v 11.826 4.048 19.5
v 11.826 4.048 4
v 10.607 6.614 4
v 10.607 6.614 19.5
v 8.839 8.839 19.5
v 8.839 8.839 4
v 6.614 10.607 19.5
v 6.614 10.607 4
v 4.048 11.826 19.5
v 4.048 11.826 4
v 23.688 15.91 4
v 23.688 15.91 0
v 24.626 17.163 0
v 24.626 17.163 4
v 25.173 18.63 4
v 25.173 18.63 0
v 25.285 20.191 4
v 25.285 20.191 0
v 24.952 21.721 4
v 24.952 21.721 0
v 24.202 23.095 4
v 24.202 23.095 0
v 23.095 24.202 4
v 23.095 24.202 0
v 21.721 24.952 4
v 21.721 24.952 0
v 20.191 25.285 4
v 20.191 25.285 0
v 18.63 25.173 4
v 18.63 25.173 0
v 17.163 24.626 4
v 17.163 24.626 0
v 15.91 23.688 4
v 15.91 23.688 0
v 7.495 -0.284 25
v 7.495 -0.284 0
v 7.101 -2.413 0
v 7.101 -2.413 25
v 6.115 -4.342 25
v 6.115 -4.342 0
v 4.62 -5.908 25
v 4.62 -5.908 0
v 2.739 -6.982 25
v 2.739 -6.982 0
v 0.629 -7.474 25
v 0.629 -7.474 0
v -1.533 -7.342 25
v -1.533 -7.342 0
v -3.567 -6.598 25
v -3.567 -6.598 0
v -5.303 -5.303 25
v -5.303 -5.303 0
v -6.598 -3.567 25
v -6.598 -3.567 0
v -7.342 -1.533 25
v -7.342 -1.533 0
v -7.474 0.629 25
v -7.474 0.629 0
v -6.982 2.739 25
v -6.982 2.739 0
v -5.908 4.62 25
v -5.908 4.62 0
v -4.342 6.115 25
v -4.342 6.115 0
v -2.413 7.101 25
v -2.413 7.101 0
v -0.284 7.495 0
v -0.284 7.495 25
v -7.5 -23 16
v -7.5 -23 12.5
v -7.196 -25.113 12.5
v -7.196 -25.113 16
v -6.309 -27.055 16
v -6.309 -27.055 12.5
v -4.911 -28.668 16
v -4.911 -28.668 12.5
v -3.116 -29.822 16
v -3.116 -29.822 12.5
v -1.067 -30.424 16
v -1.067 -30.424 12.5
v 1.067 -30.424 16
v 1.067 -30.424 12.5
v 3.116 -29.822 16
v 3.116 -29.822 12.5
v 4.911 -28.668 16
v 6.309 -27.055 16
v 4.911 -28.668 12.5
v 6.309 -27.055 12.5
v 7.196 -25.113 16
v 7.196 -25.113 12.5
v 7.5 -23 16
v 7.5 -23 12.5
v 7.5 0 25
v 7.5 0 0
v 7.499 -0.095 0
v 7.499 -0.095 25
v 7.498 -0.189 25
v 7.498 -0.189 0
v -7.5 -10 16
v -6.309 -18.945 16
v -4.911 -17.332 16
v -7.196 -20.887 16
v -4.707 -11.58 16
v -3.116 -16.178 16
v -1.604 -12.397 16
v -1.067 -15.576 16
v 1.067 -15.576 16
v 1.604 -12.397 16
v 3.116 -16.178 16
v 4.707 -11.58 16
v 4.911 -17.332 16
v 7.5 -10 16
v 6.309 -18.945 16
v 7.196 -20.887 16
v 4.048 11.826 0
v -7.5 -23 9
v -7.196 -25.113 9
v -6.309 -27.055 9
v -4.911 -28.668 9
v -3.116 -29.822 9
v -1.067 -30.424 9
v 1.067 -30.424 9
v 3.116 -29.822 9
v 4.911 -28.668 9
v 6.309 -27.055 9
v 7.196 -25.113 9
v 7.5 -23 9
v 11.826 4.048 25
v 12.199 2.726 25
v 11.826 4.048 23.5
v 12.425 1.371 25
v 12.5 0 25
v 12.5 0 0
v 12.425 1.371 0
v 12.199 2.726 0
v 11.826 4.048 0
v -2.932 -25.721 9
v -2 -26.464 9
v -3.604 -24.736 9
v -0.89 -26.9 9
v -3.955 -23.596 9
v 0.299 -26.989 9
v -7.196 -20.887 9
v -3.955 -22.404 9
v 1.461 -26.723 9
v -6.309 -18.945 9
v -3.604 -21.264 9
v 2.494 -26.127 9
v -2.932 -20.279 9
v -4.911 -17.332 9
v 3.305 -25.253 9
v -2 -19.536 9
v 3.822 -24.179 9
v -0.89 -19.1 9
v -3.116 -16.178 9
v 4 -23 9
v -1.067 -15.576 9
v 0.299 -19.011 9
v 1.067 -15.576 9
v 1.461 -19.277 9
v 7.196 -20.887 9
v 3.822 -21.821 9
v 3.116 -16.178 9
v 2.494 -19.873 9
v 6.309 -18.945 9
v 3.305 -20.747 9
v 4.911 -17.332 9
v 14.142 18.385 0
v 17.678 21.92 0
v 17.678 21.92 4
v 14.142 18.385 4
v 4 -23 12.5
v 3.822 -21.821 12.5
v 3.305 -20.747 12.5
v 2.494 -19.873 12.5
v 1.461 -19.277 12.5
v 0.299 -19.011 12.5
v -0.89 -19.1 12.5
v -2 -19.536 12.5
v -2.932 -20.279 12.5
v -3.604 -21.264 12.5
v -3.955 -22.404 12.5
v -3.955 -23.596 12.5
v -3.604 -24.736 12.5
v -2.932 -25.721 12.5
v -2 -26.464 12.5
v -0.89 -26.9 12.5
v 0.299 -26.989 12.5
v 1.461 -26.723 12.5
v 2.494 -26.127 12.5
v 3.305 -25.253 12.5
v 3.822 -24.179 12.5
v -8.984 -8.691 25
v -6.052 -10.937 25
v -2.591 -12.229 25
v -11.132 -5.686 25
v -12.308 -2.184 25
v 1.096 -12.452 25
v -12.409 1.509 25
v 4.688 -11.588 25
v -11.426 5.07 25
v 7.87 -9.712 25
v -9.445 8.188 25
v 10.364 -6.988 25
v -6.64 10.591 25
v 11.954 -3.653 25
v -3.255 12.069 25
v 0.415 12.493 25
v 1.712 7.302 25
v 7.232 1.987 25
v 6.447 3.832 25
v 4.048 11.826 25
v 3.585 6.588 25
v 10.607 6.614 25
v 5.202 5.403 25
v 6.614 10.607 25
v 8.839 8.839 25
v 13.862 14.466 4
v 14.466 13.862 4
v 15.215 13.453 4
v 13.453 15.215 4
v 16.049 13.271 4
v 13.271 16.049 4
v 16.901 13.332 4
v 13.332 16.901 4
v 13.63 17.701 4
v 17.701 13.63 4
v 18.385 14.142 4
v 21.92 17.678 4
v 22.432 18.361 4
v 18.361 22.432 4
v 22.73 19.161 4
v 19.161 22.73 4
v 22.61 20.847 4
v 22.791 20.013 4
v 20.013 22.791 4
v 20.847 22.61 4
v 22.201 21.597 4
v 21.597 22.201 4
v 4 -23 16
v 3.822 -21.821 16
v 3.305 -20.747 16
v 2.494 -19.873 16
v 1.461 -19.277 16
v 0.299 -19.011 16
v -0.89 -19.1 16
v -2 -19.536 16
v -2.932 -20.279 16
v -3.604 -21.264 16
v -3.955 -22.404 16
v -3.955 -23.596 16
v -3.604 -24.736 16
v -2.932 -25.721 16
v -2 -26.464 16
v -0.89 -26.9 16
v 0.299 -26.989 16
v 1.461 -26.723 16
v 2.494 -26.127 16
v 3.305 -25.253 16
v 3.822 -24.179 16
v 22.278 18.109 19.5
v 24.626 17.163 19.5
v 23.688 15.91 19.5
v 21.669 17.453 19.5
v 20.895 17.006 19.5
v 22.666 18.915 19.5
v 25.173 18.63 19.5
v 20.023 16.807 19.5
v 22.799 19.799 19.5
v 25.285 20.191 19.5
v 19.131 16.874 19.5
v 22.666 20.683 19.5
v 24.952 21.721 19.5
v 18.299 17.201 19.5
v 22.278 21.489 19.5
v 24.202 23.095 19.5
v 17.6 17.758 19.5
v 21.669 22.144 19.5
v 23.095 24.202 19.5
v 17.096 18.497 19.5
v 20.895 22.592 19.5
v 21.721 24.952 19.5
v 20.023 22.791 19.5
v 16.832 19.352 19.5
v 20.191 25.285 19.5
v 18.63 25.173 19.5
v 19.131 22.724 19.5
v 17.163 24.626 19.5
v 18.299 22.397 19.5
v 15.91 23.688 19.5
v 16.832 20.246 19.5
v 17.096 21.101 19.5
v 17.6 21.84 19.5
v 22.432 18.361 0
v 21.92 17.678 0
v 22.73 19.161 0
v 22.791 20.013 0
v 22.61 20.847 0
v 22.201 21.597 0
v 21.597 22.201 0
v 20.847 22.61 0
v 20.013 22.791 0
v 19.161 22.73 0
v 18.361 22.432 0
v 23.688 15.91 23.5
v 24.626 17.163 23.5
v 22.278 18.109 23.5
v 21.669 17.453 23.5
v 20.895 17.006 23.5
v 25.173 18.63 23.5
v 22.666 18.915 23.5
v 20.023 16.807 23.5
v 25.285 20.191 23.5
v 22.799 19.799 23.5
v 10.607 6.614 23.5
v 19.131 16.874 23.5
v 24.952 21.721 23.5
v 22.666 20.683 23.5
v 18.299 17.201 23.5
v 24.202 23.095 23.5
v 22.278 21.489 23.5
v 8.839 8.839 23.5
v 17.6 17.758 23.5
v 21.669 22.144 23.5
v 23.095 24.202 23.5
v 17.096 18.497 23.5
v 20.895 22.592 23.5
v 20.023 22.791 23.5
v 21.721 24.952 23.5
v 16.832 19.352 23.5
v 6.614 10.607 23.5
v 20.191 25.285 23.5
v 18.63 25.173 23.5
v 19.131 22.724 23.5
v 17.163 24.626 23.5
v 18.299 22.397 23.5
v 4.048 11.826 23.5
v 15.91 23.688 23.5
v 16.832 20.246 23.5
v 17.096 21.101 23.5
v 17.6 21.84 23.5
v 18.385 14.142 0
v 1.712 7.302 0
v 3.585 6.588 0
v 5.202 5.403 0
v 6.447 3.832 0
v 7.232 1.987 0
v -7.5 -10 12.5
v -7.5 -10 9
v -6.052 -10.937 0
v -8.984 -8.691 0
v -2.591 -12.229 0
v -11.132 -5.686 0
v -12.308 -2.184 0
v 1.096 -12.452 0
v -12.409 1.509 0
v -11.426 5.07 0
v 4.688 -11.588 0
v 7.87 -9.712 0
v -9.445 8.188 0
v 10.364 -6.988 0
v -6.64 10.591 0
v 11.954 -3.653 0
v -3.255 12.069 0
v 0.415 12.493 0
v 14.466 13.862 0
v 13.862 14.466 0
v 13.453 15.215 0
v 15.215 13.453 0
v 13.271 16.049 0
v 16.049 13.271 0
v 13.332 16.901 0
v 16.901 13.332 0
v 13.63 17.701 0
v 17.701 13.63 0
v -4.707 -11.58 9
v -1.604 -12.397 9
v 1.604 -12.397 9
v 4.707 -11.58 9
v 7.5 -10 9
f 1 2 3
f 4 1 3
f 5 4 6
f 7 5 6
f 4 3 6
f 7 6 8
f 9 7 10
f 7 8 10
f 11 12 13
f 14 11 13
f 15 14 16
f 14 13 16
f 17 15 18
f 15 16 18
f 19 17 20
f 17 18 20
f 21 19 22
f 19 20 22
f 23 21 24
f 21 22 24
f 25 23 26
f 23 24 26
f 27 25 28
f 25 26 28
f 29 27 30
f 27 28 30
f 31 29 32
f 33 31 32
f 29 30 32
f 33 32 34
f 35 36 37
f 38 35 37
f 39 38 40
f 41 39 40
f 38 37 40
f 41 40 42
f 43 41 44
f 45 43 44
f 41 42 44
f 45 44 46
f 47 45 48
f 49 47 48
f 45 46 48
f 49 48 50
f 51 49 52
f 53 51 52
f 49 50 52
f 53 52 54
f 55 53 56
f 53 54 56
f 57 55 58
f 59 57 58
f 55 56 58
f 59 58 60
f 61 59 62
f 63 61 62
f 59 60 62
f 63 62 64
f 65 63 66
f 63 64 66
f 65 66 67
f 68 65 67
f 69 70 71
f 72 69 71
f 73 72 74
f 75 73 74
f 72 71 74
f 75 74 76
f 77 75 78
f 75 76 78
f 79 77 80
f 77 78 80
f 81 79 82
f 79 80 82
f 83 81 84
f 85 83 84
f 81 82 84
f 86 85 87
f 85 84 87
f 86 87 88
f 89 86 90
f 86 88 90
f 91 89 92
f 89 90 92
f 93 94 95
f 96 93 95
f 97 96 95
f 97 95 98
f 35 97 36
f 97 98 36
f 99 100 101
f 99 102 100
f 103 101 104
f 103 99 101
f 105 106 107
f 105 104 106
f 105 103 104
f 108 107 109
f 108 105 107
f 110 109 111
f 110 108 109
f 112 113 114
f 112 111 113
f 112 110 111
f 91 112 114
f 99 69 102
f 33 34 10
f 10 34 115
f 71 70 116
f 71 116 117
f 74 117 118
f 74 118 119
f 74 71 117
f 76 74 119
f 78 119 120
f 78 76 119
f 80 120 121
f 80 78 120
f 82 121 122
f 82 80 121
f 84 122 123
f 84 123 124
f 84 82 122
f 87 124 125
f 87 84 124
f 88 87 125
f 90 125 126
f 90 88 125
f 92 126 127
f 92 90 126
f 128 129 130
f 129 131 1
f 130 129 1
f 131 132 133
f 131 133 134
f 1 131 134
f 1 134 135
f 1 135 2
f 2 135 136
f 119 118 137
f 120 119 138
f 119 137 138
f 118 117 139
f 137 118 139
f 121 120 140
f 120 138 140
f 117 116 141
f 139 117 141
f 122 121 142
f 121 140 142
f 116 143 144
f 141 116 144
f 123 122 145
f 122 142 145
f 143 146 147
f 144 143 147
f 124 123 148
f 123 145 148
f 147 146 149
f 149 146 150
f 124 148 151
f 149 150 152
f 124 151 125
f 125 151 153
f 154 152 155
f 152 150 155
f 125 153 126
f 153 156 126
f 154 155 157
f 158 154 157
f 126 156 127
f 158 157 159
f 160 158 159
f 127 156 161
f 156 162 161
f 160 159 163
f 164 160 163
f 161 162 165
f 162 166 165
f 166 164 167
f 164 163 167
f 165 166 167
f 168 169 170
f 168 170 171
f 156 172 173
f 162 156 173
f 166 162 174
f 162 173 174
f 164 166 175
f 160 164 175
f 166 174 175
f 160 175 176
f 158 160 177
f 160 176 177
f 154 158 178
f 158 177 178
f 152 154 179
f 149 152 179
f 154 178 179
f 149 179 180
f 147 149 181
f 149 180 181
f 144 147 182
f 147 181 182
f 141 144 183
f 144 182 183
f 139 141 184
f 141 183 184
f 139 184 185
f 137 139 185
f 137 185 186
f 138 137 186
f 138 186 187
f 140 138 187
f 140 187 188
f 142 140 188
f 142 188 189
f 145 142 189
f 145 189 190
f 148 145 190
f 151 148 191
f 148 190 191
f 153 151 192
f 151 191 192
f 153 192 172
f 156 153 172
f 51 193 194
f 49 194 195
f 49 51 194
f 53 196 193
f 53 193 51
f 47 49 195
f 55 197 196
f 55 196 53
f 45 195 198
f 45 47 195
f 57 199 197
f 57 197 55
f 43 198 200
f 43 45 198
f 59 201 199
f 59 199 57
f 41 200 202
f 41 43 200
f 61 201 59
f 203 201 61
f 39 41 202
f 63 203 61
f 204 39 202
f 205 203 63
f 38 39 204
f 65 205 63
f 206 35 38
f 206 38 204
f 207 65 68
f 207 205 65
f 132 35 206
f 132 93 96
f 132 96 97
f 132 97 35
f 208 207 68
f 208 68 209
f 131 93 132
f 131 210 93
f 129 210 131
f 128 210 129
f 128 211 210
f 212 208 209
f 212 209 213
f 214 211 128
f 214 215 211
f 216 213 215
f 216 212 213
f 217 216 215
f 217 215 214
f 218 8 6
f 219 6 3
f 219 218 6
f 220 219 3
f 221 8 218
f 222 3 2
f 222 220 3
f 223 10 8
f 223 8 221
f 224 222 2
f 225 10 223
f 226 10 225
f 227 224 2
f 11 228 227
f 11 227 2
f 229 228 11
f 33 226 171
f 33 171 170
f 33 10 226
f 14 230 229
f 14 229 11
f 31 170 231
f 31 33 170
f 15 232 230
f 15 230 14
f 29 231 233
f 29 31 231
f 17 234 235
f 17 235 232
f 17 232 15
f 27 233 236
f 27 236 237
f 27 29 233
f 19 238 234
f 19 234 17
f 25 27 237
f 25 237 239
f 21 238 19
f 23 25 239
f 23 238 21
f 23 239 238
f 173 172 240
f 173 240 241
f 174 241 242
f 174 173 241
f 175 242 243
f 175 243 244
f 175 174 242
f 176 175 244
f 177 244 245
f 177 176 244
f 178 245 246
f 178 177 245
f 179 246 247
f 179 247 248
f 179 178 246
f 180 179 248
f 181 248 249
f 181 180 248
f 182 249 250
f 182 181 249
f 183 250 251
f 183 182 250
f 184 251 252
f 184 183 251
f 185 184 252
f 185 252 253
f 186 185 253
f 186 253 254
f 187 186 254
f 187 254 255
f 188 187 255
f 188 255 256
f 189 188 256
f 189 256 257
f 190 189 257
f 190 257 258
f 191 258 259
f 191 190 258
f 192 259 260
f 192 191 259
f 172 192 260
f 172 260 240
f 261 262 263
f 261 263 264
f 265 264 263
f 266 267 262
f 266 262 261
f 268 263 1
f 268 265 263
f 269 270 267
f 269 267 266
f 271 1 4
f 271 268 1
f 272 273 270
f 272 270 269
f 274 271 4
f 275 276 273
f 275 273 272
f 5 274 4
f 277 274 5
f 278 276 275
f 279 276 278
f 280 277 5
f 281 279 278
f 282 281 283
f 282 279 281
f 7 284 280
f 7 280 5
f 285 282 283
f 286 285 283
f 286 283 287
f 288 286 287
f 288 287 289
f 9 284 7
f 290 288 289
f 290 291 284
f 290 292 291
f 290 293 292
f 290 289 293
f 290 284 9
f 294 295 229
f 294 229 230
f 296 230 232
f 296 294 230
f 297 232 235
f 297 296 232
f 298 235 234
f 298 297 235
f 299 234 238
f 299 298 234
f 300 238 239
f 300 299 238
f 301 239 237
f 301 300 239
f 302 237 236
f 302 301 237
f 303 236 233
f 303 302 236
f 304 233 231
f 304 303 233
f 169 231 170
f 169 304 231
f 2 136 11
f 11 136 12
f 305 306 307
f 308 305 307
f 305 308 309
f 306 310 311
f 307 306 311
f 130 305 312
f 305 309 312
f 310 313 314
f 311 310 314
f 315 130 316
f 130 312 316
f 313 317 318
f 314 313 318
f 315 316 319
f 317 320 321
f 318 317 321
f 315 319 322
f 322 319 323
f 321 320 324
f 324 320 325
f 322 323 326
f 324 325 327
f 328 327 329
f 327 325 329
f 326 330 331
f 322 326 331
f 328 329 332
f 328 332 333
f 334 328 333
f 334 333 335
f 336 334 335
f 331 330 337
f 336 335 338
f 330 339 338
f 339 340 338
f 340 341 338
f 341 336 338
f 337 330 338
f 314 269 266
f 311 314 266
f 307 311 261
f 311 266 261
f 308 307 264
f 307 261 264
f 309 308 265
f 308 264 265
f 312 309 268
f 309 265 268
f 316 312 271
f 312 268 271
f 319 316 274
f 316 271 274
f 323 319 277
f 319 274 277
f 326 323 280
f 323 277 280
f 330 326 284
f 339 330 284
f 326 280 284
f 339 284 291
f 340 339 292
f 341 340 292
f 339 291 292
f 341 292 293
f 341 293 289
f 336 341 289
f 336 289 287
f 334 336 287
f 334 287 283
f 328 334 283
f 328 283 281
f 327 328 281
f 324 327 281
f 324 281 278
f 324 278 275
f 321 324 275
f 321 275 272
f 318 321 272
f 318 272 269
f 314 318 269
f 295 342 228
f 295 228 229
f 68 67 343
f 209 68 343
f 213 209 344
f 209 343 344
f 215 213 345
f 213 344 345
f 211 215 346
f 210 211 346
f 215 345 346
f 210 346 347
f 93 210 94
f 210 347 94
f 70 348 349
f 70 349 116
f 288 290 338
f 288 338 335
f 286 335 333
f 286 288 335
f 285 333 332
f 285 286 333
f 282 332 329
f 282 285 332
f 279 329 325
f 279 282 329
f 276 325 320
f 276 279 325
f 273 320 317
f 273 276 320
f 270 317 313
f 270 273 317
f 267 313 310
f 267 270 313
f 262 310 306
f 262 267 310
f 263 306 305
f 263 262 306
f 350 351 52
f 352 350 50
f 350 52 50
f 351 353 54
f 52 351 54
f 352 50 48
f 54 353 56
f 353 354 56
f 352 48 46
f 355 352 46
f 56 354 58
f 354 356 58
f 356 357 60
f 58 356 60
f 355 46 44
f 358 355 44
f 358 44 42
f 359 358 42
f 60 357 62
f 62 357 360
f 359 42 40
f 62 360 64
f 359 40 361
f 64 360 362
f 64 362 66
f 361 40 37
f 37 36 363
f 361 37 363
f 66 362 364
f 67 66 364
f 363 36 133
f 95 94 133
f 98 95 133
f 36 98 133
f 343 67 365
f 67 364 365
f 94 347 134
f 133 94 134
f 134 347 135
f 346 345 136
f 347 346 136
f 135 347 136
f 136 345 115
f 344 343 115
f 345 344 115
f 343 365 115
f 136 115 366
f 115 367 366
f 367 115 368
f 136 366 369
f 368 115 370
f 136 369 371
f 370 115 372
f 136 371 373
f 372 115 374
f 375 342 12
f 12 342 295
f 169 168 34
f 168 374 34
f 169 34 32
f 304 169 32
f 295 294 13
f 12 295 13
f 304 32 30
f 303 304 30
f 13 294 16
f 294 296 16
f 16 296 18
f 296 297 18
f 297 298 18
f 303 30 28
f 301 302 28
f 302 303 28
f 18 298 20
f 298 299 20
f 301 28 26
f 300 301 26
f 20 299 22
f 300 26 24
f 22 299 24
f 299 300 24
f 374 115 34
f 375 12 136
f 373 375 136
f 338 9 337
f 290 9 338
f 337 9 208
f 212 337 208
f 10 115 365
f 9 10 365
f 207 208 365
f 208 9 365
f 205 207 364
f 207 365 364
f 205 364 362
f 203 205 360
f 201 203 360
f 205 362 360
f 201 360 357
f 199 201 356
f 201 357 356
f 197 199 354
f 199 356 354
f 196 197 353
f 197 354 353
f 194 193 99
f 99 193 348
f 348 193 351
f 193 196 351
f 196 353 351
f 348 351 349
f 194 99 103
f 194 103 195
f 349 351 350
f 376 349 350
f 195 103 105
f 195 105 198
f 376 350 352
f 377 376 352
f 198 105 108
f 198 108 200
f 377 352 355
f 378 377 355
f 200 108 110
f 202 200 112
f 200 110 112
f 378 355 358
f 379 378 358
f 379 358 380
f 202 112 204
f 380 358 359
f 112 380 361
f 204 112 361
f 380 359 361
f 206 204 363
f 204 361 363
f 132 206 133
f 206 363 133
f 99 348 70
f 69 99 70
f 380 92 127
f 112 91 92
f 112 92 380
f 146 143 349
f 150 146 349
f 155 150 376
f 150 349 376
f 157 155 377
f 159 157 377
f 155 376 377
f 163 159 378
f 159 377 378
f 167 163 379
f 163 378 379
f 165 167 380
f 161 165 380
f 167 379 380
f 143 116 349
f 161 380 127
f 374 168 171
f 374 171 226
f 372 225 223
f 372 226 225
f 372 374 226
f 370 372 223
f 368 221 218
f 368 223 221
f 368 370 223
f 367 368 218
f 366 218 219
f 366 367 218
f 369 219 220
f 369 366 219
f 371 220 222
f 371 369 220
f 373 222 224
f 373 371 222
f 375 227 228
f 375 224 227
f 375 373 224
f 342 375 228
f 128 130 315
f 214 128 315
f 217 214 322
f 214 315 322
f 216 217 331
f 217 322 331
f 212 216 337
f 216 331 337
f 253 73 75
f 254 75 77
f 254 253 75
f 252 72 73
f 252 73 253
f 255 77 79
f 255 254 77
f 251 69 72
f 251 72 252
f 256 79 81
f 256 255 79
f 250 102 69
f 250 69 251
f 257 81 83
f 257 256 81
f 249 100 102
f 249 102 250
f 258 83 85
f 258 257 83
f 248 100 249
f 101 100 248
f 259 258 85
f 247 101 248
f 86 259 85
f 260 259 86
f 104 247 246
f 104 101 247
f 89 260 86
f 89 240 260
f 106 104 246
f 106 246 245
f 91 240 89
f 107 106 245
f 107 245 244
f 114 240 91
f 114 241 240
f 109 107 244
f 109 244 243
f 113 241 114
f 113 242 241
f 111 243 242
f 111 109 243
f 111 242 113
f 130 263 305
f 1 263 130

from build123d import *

# Parameters (mm, degrees)
SKETCH_1_R          = 12.5
SKETCH_1_R_2        = 7.5
EXTRUDE_1_DEPTH     = 25
SKETCH_1_4_R        = 3
EXTRUDE_3_DEPTH     = 4
EXTRUDE_START       = -4
EXTRUDE_4_DEPTH     = 4
SKETCH_3_R          = 3
CUT_EXTRUDE_1_DEPTH = 41.747119864
CUT_EXTRUDE_2_REACH = 45.647
SKETCH_5_R          = 4
EXTRUDE_5_DEPTH     = 3.5


with BuildPart() as part:
    # Эскиз1 → Бобышка-Вытянуть1 (new body)
    with BuildSketch(Plane.XY):
        Circle(SKETCH_1_R)
        Circle(SKETCH_1_R_2, mode=Mode.SUBTRACT)
    extrude(amount=EXTRUDE_1_DEPTH)

    # Эскиз1<4> → Бобышка-Вытянуть3 (add)
    with BuildSketch(Plane.XY):
        with BuildLine():
            Line((15.909902577, 23.68807717), (4.048166637, 11.82634123))
            ThreePointArc((4.048166637, 11.82634123), (8.838834765, 8.838834765), (11.82634123, 4.048166637))
            Line((11.82634123, 4.048166637), (23.68807717, 15.909902577))
            ThreePointArc((23.68807717, 15.909902577), (23.68807717, 23.68807717), (15.909902577, 23.68807717))
        make_face()
        with Locations((19.798989873, 19.798989873)):
            Circle(SKETCH_1_4_R, mode=Mode.SUBTRACT)
    extrude(amount=EXTRUDE_3_DEPTH)

    # Эскиз2 → Бобышка-Вытянуть4 (add)
    with BuildSketch(Plane.XY.offset(23.5).offset(EXTRUDE_START)):
        with BuildLine():
            Line((4.048166637, 11.82634123), (15.909902577, 23.68807717))
            ThreePointArc((15.909902577, 23.68807717), (23.68807717, 23.68807717), (23.68807717, 15.909902577))
            Line((23.68807717, 15.909902577), (11.82634123, 4.048166637))
            ThreePointArc((11.82634123, 4.048166637), (8.838834765, 8.838834765), (4.048166637, 11.82634123))
        make_face()
    extrude(amount=EXTRUDE_4_DEPTH)

    # Эскиз3 → Вырез-Вытянуть1 (cut, through all)
    with BuildSketch(Plane(origin=(0, 0, 19.5), x_dir=(-1, 0, 0), z_dir=(0, 0, -1))):
        with Locations((-19.798989873, 19.798989873)):
            Circle(SKETCH_3_R)
    extrude(amount=-CUT_EXTRUDE_1_DEPTH, mode=Mode.SUBTRACT)

    # Эскиз4 → Вырез-Вытянуть2 (cut, up to next)
    with BuildSketch(Plane(origin=(0, 0, 0), x_dir=(-1, 0, 0), z_dir=(0, 0, -1)), mode=Mode.PRIVATE) as cut_extrude_2_sk1:
        with BuildLine():
            Line((-17.67766953, 21.920310217), (-14.142135624, 18.384776311))
            ThreePointArc((-14.142135624, 18.384776311), (-14.142135624, 14.142135624), (-18.384776311, 14.142135624))
            Line((-18.384776311, 14.142135624), (-21.920310217, 17.67766953))
            ThreePointArc((-21.920310217, 17.67766953), (-21.920310217, 21.920310217), (-17.67766953, 21.920310217))
        make_face()
    cut_extrude_2_tool1 = extrude(cut_extrude_2_sk1.sketch, amount=-CUT_EXTRUDE_2_REACH, mode=Mode.PRIVATE) & part.part
    add(cut_extrude_2_tool1.solids().sort_by_distance((18.031223, 18.031223, 0))[0], mode=Mode.SUBTRACT)

    # Эскиз5 → Бобышка-Вытянуть5 (add, symmetric)
    with BuildSketch(Plane.XY.offset(12.5)):
        with BuildLine():
            Line((-7.5, -10), (-7.5, -23))
            ThreePointArc((-7.5, -23), (0, -30.5), (7.5, -23))
            Line((7.5, -23), (7.5, -10))
            Line((7.5, -10), (-7.5, -10))
        make_face()
        with Locations((0, -23)):
            Circle(SKETCH_5_R, mode=Mode.SUBTRACT)
    extrude(amount=EXTRUDE_5_DEPTH, both=True)


solid = part.part
